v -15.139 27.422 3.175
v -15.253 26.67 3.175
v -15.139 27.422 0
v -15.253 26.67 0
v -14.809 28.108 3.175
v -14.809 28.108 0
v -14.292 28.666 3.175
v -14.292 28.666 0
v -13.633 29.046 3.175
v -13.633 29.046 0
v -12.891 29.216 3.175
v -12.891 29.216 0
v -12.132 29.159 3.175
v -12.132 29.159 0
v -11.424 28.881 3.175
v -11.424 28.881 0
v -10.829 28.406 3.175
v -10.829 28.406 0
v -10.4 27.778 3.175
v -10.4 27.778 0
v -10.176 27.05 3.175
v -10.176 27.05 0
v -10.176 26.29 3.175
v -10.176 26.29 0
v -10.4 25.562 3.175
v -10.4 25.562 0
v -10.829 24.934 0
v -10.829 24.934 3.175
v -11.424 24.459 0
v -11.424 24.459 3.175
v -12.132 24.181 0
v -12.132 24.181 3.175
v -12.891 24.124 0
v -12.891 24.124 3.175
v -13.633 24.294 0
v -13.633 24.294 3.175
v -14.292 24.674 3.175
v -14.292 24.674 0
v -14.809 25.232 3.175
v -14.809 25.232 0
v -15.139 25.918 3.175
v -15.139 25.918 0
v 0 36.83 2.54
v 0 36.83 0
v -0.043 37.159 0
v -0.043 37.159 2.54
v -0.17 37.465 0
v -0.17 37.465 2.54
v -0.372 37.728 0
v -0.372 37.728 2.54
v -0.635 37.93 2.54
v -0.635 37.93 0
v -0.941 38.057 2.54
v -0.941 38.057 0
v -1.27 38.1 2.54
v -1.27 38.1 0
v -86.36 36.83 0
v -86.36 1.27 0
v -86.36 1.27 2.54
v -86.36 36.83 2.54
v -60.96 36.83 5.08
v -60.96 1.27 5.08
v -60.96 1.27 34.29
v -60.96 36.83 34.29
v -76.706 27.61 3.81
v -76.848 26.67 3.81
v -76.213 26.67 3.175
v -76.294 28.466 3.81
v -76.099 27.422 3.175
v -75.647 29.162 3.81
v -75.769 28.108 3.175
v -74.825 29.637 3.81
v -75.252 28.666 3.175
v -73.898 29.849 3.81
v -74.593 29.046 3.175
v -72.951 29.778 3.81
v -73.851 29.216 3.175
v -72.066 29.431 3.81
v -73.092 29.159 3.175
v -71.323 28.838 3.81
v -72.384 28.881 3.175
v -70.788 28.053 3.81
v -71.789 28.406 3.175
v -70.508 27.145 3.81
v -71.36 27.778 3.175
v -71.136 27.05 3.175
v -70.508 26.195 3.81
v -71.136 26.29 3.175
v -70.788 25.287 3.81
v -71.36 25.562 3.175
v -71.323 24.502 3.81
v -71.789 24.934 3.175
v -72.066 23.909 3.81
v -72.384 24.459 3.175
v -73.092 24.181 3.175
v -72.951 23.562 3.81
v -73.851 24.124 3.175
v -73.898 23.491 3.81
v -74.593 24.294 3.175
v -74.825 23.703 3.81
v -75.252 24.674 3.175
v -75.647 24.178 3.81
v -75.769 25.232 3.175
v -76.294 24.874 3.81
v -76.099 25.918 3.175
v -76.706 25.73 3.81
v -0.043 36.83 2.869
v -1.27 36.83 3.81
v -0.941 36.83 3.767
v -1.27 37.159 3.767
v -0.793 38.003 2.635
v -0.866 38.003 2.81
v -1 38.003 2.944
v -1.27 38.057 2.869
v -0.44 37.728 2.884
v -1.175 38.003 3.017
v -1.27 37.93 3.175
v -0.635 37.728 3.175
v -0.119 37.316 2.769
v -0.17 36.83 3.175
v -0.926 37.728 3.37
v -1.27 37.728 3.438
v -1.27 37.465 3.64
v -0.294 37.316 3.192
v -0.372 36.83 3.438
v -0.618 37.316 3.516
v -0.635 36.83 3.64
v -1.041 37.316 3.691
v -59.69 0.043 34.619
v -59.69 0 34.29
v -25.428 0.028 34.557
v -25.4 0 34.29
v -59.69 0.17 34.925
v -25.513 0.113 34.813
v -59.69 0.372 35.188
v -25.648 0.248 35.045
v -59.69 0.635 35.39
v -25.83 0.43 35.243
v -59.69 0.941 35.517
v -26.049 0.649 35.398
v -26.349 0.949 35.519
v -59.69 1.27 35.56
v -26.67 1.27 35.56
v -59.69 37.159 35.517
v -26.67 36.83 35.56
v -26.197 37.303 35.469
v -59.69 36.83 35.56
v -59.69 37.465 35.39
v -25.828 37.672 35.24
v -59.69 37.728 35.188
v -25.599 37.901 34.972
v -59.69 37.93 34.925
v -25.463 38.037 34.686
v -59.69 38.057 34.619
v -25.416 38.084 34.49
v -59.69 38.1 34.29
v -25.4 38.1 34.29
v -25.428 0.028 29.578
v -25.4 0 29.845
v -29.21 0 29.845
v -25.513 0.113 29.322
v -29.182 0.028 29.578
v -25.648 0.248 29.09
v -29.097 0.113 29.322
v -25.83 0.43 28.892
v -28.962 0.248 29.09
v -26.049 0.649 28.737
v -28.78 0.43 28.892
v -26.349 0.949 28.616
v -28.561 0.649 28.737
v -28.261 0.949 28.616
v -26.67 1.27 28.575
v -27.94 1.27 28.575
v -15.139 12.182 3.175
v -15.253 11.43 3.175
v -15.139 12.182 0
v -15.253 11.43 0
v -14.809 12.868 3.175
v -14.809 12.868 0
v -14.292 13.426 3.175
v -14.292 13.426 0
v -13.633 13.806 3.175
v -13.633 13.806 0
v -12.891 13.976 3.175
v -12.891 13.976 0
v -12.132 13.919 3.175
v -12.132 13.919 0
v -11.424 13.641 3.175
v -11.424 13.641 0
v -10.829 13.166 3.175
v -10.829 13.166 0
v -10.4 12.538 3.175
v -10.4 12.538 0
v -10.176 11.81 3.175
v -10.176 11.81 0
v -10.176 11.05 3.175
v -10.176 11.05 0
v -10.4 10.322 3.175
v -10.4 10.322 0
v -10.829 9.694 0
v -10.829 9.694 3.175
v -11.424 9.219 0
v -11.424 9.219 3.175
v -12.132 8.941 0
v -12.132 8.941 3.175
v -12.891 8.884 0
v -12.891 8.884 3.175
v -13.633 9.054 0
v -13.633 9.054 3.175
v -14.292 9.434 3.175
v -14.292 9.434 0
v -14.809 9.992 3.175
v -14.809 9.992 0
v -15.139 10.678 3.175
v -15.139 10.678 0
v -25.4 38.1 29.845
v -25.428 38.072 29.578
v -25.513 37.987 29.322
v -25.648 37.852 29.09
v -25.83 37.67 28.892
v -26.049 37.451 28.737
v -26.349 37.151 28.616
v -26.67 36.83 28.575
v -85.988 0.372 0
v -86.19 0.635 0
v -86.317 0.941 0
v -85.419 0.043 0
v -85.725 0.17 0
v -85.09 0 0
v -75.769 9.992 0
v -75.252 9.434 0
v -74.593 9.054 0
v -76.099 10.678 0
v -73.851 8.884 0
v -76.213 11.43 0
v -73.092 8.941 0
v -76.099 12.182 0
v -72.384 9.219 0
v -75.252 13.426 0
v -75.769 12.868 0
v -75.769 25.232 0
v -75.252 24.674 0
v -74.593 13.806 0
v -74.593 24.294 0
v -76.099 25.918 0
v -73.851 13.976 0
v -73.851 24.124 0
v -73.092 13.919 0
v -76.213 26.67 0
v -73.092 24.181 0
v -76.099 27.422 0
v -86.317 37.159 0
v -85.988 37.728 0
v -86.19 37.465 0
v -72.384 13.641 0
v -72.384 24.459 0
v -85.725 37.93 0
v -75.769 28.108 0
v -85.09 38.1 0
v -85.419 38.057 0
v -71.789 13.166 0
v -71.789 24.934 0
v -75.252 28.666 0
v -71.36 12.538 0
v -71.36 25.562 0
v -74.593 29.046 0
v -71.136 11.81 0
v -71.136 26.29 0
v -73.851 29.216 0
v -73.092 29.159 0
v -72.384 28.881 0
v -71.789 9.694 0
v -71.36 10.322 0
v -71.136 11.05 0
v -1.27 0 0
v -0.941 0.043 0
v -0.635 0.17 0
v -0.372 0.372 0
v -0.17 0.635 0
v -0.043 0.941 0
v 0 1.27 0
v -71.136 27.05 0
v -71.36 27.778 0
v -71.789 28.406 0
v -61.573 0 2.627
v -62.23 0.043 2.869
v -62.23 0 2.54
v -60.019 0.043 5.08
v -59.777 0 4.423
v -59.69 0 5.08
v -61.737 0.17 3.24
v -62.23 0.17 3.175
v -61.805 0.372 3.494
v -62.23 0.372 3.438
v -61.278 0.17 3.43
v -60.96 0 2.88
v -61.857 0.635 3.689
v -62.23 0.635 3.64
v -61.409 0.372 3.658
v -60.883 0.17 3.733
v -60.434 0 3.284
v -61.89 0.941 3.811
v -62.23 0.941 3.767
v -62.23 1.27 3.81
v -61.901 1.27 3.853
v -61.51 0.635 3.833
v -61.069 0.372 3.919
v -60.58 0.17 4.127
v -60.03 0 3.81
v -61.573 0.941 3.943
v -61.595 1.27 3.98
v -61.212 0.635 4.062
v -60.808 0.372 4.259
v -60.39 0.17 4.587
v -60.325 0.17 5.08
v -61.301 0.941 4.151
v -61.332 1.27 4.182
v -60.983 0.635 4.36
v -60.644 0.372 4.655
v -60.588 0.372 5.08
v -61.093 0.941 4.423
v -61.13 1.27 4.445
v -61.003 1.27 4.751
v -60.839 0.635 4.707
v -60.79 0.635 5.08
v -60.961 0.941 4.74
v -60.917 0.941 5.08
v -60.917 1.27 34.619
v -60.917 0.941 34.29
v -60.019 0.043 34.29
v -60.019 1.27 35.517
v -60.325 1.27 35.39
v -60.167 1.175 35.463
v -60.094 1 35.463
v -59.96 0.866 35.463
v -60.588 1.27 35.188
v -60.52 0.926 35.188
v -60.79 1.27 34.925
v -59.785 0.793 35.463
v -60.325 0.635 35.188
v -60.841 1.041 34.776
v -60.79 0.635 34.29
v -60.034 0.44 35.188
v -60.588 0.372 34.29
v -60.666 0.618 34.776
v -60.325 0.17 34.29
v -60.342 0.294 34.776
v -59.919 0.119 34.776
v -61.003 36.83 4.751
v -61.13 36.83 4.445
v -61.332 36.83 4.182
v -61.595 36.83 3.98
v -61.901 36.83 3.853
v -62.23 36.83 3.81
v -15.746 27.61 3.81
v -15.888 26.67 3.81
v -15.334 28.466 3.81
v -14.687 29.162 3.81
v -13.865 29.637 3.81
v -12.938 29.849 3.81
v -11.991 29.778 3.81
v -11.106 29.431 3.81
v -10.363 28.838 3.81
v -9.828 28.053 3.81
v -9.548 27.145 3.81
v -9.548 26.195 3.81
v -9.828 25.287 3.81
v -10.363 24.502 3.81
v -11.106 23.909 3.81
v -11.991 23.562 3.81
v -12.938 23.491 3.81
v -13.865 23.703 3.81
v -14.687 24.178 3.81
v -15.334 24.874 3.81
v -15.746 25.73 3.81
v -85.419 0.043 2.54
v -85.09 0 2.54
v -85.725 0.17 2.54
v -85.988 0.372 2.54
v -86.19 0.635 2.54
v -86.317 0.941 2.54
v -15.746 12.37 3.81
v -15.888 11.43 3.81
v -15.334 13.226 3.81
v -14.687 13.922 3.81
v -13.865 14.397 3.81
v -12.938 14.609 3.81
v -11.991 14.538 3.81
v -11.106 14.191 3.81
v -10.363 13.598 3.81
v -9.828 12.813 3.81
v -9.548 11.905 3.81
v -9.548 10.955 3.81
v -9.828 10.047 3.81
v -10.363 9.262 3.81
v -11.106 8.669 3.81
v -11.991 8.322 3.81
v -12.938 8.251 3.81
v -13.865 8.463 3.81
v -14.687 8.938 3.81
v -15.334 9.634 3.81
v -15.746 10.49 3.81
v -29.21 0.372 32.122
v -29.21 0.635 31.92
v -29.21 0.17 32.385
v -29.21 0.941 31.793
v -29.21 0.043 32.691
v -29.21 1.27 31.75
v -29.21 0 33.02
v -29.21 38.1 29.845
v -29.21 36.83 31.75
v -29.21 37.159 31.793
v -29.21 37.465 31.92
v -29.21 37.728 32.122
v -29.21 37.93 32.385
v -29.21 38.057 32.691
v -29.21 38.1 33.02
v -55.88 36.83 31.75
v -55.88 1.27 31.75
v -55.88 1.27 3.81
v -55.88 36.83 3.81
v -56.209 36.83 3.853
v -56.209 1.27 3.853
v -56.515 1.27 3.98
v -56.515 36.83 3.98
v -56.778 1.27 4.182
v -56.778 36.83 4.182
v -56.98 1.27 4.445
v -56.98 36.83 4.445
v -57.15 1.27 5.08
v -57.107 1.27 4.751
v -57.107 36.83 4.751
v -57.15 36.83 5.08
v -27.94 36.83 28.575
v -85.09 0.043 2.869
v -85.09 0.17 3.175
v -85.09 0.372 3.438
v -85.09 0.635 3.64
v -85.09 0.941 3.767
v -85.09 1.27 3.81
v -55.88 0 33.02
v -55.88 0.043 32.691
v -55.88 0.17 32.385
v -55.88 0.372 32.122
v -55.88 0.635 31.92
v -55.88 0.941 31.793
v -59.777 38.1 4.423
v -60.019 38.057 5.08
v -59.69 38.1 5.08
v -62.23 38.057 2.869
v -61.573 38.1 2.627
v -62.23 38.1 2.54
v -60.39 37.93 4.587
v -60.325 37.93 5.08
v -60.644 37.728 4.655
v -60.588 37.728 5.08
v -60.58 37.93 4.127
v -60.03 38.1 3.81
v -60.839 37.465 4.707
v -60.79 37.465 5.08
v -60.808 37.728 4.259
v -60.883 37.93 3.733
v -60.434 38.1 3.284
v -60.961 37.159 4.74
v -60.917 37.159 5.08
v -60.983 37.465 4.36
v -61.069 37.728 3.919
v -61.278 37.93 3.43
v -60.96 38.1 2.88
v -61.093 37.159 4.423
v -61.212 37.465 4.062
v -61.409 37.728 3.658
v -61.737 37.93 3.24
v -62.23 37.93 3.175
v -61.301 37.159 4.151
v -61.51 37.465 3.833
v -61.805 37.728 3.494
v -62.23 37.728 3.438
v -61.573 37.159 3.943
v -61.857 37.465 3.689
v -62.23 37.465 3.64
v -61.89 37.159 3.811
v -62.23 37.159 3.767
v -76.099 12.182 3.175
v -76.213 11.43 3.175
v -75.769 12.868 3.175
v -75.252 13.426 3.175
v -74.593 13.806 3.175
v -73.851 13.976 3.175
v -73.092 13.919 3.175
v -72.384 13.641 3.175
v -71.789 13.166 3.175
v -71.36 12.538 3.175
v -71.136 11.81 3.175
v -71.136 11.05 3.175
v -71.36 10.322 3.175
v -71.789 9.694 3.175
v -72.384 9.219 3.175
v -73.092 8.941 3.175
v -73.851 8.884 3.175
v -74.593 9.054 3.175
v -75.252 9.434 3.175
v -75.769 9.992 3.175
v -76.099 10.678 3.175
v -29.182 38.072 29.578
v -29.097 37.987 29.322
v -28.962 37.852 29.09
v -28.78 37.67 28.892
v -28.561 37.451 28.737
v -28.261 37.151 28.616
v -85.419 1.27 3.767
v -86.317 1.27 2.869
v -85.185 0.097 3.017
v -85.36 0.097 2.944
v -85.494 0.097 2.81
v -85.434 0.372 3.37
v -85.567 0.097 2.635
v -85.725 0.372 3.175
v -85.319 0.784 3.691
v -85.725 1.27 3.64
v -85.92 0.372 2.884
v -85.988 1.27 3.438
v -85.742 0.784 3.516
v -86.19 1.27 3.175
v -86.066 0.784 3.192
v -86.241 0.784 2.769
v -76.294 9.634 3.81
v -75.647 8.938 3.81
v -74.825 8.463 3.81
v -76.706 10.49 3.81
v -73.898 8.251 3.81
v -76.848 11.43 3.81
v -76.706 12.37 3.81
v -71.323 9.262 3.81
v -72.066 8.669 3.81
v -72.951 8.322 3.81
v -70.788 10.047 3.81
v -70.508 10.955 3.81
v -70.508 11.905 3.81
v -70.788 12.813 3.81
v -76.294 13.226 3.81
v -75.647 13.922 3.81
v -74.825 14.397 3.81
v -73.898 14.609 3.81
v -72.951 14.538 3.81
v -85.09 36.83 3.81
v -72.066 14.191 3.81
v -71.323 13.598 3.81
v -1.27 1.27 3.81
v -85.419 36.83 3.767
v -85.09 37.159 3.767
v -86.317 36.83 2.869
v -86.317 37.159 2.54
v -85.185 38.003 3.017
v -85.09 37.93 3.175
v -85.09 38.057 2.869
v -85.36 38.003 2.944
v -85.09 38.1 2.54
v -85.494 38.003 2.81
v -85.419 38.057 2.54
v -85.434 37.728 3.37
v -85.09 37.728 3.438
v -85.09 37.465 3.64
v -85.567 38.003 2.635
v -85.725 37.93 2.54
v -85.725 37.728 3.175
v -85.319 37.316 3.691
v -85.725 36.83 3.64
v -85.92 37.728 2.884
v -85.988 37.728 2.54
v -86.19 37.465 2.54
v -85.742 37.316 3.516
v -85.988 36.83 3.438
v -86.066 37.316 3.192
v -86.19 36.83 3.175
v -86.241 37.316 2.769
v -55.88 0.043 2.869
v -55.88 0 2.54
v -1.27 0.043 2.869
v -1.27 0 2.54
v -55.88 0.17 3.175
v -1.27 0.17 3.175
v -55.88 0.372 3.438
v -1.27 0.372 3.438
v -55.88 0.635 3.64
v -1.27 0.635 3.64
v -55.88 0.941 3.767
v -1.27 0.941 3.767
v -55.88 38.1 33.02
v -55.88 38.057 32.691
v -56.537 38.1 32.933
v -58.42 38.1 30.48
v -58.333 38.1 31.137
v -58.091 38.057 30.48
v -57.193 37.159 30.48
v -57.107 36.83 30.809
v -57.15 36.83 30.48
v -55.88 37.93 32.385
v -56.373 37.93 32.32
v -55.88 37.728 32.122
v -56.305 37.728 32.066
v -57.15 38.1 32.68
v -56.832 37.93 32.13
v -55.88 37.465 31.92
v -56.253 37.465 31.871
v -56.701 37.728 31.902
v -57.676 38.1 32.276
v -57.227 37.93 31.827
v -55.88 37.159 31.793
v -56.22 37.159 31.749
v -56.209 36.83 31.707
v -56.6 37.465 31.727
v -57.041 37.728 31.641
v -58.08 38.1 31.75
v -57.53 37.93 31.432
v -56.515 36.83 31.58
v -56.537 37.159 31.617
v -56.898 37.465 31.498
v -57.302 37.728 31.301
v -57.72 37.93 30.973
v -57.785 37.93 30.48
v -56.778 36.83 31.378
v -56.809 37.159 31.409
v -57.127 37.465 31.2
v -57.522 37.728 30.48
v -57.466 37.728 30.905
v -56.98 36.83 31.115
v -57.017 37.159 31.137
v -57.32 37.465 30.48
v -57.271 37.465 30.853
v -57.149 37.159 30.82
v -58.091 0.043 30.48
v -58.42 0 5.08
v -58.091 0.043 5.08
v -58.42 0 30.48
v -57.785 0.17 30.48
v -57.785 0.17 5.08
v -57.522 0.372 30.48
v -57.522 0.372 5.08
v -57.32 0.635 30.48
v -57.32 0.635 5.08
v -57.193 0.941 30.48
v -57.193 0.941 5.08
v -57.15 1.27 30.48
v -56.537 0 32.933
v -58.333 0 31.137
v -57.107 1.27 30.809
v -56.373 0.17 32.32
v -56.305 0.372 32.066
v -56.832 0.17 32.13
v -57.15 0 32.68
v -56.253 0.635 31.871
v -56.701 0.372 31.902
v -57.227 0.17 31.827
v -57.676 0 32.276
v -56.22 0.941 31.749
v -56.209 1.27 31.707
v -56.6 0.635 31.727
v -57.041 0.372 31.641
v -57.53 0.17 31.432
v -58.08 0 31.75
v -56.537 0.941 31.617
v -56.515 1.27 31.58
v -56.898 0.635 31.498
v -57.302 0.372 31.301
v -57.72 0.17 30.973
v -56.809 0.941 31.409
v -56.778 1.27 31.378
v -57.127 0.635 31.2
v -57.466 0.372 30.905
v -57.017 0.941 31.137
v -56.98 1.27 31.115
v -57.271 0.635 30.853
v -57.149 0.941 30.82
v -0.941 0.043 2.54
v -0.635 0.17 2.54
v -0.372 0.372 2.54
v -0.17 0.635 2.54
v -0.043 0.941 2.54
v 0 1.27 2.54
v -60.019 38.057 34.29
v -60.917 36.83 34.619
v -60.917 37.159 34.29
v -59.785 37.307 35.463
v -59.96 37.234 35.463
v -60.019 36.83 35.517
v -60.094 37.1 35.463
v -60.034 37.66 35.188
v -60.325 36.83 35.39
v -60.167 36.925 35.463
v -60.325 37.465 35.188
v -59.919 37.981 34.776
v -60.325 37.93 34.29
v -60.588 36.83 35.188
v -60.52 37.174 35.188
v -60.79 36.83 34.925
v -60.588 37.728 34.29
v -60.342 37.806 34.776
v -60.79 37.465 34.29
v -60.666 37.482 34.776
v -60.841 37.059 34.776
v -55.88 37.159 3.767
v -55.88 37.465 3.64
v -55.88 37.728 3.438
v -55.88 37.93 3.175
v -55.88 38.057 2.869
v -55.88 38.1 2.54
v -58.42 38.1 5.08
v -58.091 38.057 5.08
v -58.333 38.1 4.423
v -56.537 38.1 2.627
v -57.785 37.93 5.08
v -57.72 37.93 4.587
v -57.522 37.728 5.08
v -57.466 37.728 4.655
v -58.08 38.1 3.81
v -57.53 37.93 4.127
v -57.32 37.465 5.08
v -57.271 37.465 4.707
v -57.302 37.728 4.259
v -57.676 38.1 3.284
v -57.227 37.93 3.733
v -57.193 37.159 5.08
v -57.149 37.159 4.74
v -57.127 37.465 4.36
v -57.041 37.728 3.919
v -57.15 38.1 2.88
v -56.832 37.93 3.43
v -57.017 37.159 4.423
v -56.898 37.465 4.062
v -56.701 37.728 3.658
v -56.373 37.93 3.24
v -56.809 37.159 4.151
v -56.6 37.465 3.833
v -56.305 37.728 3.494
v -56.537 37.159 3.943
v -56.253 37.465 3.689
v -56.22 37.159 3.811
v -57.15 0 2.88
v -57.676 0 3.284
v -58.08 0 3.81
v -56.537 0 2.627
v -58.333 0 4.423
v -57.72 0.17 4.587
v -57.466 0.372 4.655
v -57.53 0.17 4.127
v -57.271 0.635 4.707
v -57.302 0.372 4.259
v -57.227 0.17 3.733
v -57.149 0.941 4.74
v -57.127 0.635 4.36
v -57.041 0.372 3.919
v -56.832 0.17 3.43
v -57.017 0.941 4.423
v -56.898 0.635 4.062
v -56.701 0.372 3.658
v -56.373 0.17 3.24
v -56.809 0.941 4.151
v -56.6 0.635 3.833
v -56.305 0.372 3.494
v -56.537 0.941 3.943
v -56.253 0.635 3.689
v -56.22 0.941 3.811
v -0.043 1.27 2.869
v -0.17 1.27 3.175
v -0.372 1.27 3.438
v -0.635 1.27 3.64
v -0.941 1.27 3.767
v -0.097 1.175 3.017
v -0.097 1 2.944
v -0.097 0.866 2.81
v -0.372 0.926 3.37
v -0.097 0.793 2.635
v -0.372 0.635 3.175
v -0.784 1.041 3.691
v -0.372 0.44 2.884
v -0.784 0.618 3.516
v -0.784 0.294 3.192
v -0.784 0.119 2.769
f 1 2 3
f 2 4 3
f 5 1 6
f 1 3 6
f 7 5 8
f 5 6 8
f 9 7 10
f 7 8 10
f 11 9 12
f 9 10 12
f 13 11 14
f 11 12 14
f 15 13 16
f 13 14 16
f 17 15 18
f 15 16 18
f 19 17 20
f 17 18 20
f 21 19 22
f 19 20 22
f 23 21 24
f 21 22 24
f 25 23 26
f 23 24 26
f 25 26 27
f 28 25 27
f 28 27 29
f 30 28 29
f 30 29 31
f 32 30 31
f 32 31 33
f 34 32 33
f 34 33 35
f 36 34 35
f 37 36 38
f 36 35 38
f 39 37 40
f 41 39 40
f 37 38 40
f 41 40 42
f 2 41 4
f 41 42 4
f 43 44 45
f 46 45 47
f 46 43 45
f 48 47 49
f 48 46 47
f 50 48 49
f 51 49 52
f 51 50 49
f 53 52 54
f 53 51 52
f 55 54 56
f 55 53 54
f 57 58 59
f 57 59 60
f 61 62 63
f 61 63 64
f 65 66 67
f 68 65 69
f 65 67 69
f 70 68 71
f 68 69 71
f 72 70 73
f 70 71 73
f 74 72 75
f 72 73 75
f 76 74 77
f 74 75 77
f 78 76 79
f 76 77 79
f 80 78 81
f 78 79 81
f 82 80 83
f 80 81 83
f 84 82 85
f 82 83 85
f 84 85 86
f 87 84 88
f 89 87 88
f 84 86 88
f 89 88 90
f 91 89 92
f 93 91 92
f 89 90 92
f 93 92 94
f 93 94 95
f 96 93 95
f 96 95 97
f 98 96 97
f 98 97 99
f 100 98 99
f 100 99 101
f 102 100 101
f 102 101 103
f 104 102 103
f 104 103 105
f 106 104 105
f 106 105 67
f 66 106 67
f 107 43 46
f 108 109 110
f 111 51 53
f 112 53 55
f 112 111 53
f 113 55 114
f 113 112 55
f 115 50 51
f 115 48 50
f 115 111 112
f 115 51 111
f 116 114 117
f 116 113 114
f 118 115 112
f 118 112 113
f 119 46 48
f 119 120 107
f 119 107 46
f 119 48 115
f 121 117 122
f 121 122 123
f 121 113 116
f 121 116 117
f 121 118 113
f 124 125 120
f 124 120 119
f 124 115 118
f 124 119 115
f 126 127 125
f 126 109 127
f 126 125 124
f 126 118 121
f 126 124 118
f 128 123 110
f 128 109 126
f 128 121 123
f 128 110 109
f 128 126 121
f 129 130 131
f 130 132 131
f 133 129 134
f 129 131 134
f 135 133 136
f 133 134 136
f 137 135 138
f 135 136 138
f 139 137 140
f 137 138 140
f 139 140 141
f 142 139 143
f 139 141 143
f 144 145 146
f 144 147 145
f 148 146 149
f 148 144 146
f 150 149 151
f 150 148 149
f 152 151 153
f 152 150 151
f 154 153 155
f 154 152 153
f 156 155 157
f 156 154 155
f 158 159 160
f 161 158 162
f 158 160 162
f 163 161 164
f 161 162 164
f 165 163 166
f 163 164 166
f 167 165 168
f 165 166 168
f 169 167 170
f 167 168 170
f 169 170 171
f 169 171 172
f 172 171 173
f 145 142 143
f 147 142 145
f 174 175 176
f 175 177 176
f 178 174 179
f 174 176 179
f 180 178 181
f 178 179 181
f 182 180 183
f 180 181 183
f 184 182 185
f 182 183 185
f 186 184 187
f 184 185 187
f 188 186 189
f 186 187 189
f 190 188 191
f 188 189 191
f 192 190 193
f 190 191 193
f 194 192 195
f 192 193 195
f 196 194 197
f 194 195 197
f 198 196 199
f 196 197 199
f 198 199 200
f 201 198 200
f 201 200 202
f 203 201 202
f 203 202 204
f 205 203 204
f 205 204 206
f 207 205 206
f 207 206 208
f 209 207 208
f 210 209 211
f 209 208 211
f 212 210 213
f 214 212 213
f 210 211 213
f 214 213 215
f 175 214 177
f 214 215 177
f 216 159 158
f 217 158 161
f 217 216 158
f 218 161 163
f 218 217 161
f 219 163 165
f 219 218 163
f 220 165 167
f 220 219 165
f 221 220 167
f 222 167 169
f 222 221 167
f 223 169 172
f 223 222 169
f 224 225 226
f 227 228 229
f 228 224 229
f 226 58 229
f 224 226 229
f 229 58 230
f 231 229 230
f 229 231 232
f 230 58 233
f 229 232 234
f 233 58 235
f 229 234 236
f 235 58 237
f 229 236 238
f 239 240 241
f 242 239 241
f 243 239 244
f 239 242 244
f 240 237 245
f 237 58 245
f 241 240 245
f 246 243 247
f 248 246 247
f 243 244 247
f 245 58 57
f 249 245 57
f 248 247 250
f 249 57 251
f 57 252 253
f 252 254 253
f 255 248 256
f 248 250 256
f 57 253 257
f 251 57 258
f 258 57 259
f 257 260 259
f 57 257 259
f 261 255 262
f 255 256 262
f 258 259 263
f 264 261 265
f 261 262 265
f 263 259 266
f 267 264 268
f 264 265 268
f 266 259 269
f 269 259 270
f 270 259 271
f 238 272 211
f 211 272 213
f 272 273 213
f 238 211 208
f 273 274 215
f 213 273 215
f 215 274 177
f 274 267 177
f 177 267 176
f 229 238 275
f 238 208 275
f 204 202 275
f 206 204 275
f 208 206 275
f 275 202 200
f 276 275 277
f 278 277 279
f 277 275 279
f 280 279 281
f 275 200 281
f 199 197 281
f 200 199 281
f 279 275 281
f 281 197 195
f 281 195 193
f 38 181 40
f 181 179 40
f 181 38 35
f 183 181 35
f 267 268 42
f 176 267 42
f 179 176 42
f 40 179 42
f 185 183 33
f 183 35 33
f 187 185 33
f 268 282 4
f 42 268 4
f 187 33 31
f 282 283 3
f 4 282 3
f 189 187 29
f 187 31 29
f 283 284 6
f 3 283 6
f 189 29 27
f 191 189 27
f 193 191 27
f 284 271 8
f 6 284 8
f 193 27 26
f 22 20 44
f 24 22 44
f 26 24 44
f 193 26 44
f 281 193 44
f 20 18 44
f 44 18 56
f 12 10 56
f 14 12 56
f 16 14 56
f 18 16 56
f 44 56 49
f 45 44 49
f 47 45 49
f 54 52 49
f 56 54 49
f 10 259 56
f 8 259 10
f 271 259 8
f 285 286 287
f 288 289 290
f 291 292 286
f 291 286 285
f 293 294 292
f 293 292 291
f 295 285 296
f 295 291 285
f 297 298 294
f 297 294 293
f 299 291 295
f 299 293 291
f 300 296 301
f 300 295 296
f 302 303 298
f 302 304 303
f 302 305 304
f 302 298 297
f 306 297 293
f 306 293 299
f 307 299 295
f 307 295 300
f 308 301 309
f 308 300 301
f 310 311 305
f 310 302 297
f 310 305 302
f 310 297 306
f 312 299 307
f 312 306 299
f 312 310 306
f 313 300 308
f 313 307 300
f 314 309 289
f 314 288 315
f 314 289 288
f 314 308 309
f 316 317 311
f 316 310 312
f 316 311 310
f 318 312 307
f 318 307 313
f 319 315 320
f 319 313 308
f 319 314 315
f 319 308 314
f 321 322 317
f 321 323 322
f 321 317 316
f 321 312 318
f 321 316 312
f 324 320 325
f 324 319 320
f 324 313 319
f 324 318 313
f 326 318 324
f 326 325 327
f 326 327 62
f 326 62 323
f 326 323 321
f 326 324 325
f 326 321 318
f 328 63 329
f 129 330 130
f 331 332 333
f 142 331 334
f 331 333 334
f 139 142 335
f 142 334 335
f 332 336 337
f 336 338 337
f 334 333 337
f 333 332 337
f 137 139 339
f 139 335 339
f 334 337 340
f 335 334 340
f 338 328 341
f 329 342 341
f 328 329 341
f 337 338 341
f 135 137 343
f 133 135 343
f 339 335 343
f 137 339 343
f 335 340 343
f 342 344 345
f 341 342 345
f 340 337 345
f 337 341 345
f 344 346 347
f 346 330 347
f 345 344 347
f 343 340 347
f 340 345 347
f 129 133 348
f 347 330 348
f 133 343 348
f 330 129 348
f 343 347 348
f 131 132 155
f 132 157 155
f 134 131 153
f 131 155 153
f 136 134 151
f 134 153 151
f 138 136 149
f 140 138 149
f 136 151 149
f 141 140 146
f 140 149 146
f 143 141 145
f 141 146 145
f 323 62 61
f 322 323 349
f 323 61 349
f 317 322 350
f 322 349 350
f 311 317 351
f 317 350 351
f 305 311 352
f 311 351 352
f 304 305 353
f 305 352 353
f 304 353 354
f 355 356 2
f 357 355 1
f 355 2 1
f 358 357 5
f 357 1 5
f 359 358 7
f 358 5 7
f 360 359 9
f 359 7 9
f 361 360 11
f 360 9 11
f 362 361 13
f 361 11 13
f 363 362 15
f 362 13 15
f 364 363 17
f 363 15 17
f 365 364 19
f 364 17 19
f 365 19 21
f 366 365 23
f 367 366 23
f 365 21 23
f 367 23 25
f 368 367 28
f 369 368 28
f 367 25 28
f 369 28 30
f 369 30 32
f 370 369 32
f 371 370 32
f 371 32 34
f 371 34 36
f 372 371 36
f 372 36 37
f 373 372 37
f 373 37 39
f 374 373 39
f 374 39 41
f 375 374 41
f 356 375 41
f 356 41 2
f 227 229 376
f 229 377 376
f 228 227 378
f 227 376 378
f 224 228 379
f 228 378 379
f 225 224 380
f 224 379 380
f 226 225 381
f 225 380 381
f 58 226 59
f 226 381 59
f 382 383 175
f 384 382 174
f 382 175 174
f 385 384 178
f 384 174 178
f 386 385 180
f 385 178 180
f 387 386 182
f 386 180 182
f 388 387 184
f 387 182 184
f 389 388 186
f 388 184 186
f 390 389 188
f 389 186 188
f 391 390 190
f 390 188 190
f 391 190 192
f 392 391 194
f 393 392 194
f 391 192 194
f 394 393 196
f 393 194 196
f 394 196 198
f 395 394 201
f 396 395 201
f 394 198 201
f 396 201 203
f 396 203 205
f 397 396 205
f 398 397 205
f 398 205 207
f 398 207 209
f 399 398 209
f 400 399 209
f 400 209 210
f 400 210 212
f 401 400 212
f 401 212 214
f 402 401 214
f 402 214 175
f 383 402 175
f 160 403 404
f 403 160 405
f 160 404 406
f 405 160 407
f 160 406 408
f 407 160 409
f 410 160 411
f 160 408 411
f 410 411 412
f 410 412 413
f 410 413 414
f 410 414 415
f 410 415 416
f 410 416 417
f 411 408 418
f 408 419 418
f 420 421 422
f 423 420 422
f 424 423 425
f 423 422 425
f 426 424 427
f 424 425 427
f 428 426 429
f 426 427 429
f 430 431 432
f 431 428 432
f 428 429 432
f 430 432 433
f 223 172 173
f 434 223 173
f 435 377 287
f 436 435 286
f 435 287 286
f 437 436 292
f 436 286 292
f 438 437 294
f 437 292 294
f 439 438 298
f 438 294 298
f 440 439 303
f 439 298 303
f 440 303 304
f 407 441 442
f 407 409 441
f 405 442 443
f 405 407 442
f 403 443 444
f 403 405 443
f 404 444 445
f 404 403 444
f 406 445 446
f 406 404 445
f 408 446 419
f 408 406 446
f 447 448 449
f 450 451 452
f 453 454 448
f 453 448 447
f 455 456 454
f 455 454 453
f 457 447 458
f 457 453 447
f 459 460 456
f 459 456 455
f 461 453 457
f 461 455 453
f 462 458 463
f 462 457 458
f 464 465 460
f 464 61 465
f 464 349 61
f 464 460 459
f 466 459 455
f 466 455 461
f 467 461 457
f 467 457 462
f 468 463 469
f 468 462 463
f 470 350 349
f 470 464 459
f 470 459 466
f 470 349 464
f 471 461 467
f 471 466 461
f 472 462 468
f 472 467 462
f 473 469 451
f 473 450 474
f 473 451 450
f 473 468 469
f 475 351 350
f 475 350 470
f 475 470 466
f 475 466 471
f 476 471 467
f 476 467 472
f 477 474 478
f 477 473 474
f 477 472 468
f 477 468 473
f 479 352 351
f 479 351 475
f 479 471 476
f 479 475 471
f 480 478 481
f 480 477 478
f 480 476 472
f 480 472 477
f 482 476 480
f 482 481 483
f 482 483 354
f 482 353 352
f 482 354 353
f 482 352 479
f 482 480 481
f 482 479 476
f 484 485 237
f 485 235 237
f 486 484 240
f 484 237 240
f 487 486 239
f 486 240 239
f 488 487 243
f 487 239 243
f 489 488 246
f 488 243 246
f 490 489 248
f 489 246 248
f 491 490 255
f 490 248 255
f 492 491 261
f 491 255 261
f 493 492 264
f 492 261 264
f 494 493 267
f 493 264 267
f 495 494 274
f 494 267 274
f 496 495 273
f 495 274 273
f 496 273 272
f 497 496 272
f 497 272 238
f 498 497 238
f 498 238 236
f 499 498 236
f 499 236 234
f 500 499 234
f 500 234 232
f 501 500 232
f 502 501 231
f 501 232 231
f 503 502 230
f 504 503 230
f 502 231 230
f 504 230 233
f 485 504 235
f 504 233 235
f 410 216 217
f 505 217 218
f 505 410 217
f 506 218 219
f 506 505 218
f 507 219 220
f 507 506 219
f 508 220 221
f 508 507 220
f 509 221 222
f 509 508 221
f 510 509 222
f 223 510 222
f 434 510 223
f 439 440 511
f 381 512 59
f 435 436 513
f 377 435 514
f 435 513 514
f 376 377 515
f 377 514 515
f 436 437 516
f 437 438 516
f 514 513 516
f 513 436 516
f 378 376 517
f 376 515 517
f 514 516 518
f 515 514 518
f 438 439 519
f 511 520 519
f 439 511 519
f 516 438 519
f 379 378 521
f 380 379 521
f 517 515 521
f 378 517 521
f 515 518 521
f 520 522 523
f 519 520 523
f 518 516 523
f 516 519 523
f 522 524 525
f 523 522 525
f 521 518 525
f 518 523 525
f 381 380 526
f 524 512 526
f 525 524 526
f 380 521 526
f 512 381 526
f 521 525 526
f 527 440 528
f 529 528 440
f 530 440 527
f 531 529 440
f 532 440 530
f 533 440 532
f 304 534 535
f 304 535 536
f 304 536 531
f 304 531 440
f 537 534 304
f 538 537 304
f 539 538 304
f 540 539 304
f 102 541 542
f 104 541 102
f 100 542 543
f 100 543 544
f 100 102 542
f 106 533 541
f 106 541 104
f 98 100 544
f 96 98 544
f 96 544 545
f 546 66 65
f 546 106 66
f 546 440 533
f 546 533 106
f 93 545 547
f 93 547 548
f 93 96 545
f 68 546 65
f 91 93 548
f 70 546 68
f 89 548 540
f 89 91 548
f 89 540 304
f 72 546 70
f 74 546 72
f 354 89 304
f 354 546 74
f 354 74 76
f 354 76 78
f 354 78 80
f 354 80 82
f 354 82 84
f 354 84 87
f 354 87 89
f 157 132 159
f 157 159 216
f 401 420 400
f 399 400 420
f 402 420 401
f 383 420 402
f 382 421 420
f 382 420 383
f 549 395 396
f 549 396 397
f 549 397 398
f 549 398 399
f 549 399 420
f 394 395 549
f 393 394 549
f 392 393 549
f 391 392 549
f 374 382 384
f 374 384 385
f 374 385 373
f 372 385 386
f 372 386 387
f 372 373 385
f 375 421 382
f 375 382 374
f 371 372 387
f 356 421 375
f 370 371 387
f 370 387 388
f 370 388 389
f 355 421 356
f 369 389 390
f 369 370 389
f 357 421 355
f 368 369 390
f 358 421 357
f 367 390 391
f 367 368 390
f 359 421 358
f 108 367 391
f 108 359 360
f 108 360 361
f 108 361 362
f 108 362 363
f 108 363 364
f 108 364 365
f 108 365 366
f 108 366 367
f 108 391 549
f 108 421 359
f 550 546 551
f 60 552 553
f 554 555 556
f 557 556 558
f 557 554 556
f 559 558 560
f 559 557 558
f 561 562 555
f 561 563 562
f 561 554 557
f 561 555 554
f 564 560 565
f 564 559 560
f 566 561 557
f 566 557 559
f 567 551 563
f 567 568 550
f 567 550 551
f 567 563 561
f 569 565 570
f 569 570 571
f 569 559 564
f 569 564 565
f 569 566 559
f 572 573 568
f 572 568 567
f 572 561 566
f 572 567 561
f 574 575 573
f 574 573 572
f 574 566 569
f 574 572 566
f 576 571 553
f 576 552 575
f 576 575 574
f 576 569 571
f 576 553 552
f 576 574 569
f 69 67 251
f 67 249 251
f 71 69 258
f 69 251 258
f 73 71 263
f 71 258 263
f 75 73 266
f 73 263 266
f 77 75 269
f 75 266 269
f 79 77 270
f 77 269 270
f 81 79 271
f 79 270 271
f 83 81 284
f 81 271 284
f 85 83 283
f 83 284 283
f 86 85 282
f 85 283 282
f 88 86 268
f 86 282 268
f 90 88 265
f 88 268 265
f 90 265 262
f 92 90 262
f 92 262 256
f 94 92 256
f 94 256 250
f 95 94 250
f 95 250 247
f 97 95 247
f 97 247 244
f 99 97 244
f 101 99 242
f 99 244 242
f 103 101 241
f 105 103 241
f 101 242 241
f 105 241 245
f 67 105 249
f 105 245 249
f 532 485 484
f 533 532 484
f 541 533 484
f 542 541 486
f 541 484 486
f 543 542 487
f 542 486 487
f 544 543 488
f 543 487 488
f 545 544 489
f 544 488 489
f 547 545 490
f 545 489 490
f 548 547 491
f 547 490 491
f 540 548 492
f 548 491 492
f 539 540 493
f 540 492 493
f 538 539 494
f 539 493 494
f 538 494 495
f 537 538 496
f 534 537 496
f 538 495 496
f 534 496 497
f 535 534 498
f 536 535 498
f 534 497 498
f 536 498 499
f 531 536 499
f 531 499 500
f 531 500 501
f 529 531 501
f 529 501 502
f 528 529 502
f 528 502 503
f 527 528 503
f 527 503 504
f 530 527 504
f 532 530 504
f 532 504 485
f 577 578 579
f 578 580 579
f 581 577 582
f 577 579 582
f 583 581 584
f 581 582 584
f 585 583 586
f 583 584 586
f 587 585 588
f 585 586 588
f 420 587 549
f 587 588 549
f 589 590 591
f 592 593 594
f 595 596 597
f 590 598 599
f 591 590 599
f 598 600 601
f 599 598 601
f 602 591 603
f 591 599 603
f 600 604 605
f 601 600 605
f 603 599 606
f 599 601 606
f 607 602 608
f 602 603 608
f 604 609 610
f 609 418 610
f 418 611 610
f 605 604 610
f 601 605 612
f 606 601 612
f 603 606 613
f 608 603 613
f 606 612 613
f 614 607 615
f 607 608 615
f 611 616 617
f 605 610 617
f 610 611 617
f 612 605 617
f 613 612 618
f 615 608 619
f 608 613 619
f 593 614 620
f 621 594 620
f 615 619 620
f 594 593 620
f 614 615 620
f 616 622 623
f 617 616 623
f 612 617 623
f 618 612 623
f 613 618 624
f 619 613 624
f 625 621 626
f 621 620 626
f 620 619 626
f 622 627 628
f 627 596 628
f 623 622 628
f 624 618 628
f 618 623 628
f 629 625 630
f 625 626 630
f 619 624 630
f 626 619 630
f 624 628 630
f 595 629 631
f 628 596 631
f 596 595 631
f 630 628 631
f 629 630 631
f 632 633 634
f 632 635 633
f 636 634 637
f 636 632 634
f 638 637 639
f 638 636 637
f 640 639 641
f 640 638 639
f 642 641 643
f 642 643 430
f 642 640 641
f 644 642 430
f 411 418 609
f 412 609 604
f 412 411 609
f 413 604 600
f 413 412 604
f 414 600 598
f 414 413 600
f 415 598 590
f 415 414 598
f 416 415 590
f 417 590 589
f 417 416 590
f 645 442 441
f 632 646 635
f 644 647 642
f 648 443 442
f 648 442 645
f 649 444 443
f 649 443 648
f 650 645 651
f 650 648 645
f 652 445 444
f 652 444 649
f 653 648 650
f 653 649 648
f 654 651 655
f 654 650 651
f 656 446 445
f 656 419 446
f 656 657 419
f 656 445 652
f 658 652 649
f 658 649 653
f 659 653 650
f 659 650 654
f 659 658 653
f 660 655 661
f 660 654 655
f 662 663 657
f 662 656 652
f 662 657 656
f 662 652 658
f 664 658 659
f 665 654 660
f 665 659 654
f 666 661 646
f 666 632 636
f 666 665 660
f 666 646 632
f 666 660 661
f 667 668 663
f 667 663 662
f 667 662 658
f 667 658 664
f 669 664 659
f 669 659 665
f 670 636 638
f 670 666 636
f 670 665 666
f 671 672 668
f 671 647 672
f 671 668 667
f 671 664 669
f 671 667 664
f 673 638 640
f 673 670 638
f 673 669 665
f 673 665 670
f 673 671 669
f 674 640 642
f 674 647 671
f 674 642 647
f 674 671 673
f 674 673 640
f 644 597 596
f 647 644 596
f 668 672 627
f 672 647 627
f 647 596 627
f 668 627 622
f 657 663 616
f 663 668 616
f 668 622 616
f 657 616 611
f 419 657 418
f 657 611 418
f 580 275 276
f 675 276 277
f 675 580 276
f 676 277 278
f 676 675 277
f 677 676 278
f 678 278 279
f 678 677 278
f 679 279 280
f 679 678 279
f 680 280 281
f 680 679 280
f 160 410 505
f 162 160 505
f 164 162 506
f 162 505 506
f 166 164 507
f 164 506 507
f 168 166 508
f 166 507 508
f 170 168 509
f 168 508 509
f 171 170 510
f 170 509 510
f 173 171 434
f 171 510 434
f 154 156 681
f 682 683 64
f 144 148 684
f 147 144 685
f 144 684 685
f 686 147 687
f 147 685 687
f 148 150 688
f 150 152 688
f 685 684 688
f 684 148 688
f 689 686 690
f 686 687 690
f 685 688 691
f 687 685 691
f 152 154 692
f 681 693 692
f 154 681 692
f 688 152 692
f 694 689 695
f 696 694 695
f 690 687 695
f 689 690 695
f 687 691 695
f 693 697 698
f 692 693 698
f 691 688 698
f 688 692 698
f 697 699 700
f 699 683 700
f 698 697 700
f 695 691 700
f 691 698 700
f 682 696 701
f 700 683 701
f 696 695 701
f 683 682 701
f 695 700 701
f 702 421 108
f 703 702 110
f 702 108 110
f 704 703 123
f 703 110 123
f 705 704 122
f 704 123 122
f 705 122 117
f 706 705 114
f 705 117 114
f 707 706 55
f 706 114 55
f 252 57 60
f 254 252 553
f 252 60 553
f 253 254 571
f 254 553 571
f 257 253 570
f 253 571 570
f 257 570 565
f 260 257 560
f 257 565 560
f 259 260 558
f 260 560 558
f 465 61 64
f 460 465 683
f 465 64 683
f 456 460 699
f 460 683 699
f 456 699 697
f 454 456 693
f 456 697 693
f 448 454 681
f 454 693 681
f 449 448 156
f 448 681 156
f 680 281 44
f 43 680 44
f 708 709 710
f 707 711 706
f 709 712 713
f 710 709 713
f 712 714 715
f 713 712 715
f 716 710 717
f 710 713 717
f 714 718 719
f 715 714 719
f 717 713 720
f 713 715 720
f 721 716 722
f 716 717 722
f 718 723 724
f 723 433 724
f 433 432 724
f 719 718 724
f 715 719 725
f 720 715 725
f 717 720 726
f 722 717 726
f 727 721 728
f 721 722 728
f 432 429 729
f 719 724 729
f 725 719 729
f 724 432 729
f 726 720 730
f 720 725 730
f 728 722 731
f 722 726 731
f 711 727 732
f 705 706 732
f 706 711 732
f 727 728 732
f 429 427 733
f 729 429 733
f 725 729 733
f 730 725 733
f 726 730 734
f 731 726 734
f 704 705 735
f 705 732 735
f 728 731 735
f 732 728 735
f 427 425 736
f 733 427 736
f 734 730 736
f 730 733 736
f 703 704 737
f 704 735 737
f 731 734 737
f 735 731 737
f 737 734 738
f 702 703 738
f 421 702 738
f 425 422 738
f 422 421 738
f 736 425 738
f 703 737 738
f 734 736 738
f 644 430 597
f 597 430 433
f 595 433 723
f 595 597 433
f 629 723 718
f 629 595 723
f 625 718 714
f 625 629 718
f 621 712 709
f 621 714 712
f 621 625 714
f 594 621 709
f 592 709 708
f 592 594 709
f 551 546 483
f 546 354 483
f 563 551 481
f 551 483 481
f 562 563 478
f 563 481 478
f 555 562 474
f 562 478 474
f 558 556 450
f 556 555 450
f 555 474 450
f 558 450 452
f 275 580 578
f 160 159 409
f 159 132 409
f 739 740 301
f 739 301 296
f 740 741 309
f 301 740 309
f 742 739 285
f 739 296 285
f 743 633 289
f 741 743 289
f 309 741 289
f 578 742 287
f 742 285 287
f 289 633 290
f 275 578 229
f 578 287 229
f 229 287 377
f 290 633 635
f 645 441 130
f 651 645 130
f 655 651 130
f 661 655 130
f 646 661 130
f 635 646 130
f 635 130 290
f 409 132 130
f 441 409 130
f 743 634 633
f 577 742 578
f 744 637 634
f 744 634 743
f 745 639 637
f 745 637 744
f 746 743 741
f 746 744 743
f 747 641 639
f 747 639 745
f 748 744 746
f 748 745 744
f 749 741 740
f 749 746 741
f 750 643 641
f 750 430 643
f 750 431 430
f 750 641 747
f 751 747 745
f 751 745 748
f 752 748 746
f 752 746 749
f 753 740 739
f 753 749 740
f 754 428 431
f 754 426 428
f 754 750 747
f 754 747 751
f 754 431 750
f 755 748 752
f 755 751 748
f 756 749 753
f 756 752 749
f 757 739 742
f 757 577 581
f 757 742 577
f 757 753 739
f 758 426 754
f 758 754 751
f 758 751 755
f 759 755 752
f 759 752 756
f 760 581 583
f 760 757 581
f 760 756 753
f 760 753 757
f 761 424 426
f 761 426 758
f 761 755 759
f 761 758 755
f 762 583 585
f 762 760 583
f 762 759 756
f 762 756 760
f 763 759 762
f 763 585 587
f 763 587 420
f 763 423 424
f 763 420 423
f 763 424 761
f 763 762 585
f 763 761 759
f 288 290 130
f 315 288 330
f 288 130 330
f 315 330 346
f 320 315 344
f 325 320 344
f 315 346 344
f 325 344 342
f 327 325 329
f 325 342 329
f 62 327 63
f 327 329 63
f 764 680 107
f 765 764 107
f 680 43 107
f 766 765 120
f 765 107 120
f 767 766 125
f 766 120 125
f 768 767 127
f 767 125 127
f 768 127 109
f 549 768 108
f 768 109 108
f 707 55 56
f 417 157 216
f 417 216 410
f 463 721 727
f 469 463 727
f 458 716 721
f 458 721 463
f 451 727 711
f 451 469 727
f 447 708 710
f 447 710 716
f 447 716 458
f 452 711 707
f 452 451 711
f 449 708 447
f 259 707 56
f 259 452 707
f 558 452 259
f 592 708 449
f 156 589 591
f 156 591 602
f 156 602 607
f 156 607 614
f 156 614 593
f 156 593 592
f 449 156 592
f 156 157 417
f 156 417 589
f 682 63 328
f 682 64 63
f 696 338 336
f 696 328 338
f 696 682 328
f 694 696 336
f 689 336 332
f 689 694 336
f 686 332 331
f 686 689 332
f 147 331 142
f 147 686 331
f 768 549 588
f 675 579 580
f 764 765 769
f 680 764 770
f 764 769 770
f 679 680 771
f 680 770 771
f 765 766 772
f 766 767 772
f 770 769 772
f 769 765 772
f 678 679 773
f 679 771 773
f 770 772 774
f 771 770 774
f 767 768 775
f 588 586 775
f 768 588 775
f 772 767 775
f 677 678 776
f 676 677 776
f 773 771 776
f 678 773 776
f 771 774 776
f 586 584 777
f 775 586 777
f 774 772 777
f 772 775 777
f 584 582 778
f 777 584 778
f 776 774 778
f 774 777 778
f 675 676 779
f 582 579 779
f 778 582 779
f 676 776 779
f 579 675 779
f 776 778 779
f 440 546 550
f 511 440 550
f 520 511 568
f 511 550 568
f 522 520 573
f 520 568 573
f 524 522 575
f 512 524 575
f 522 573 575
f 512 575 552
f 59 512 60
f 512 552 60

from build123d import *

# Parameters (mm, degrees)
SKETCH1_W                        = 86.36
SKETCH1_H                        = 38.1
BOSS_EXTRUDE1_DEPTH              = 3.81
SKETCH2_W                        = 3.81
SKETCH2_H                        = 38.1
BOSS_EXTRUDE2_DEPTH              = 31.75
SKETCH3_W                        = 3.81
SKETCH3_H                        = 38.1
BOSS_EXTRUDE3_DEPTH              = 31.75
SKETCH4_W                        = 3.81
SKETCH4_H                        = 38.1
BOSS_EXTRUDE4_DEPTH              = 3.175
FILLET1_R                        = 1.27
F_10_CLEARANCE_HOLE1_D           = 5.1054
F_10_CLEARANCE_HOLE1_CSINK_D     = 6.3754
F_10_CLEARANCE_HOLE1_CSINK_ANGLE = 90


with BuildPart() as part:
    # Sketch1 → Boss-Extrude1 (new body)
    with BuildSketch(Plane.XY):
        with Locations((-43.18, 19.05)):
            Rectangle(SKETCH1_W, SKETCH1_H)
    extrude(amount=BOSS_EXTRUDE1_DEPTH)

    # Sketch2 → Boss-Extrude2 (add)
    with BuildSketch(Plane.XY.offset(3.81)):
        with Locations((-59.055, 19.05)):
            Rectangle(SKETCH2_W, SKETCH2_H)
    extrude(amount=BOSS_EXTRUDE2_DEPTH)

    # Sketch3 → Boss-Extrude3 (add)
    with BuildSketch(Plane(origin=(-57.15, 0, 0), x_dir=(0, 0, -1), z_dir=(1, 0, 0))):
        with Locations((-33.655, 19.05)):
            Rectangle(SKETCH3_W, SKETCH3_H)
    extrude(amount=BOSS_EXTRUDE3_DEPTH)

    # Sketch4 → Boss-Extrude4 (add)
    with BuildSketch(Plane(origin=(0, 0, 31.75), x_dir=(-1, 0, 0), z_dir=(0, 0, -1))):
        with Locations((27.305, 19.05)):
            Rectangle(SKETCH4_W, SKETCH4_H)
    extrude(amount=BOSS_EXTRUDE4_DEPTH)

    # Fillet1
    fillet1_edges = [part.edges().sort_by_distance(p)[0] for p in [
        (-86.36, 19.05, 3.81),
        (-73.66, 38.1, 3.81),
        (-28.575, 0, 3.81),
        (-57.15, 19.05, 3.81),
        (-60.96, 19.05, 3.81),
        (-73.66, 0, 3.81),
        (-60.96, 38.1, 19.685),
        (-60.96, 0, 19.685),
        (-43.18, 38.1, 35.56),
        (-60.96, 19.05, 35.56),
        (-43.18, 0, 35.56),
        (-57.15, 38.1, 17.78),
        (-57.15, 0, 17.78),
        (-57.15, 19.05, 31.75),
        (-25.4, 19.05, 35.56),
        (-43.18, 38.1, 31.75),
        (-43.18, 0, 31.75),
        (-25.4, 19.05, 28.575),
        (-27.305, 0, 28.575),
        (-29.21, 19.05, 28.575),
        (-27.305, 38.1, 28.575),
        (0, 19.05, 3.81),
        (0, 0, 1.905),
        (-86.36, 0, 1.905),
        (-86.36, 38.1, 1.905),
        (0, 38.1, 1.905),
        (-28.575, 38.1, 3.81),
    ]]
    fillet(fillet1_edges, radius=FILLET1_R)

    # #10 Clearance Hole1 (through all)
    with Locations(Plane.XY.offset(3.81)):
        with Locations((-73.66, 11.43), (-73.66, 26.67), (-12.7, 11.43), (-12.7, 26.67)):
            CounterSinkHole(F_10_CLEARANCE_HOLE1_D / 2, F_10_CLEARANCE_HOLE1_CSINK_D / 2, counter_sink_angle=F_10_CLEARANCE_HOLE1_CSINK_ANGLE)


solid = part.part
